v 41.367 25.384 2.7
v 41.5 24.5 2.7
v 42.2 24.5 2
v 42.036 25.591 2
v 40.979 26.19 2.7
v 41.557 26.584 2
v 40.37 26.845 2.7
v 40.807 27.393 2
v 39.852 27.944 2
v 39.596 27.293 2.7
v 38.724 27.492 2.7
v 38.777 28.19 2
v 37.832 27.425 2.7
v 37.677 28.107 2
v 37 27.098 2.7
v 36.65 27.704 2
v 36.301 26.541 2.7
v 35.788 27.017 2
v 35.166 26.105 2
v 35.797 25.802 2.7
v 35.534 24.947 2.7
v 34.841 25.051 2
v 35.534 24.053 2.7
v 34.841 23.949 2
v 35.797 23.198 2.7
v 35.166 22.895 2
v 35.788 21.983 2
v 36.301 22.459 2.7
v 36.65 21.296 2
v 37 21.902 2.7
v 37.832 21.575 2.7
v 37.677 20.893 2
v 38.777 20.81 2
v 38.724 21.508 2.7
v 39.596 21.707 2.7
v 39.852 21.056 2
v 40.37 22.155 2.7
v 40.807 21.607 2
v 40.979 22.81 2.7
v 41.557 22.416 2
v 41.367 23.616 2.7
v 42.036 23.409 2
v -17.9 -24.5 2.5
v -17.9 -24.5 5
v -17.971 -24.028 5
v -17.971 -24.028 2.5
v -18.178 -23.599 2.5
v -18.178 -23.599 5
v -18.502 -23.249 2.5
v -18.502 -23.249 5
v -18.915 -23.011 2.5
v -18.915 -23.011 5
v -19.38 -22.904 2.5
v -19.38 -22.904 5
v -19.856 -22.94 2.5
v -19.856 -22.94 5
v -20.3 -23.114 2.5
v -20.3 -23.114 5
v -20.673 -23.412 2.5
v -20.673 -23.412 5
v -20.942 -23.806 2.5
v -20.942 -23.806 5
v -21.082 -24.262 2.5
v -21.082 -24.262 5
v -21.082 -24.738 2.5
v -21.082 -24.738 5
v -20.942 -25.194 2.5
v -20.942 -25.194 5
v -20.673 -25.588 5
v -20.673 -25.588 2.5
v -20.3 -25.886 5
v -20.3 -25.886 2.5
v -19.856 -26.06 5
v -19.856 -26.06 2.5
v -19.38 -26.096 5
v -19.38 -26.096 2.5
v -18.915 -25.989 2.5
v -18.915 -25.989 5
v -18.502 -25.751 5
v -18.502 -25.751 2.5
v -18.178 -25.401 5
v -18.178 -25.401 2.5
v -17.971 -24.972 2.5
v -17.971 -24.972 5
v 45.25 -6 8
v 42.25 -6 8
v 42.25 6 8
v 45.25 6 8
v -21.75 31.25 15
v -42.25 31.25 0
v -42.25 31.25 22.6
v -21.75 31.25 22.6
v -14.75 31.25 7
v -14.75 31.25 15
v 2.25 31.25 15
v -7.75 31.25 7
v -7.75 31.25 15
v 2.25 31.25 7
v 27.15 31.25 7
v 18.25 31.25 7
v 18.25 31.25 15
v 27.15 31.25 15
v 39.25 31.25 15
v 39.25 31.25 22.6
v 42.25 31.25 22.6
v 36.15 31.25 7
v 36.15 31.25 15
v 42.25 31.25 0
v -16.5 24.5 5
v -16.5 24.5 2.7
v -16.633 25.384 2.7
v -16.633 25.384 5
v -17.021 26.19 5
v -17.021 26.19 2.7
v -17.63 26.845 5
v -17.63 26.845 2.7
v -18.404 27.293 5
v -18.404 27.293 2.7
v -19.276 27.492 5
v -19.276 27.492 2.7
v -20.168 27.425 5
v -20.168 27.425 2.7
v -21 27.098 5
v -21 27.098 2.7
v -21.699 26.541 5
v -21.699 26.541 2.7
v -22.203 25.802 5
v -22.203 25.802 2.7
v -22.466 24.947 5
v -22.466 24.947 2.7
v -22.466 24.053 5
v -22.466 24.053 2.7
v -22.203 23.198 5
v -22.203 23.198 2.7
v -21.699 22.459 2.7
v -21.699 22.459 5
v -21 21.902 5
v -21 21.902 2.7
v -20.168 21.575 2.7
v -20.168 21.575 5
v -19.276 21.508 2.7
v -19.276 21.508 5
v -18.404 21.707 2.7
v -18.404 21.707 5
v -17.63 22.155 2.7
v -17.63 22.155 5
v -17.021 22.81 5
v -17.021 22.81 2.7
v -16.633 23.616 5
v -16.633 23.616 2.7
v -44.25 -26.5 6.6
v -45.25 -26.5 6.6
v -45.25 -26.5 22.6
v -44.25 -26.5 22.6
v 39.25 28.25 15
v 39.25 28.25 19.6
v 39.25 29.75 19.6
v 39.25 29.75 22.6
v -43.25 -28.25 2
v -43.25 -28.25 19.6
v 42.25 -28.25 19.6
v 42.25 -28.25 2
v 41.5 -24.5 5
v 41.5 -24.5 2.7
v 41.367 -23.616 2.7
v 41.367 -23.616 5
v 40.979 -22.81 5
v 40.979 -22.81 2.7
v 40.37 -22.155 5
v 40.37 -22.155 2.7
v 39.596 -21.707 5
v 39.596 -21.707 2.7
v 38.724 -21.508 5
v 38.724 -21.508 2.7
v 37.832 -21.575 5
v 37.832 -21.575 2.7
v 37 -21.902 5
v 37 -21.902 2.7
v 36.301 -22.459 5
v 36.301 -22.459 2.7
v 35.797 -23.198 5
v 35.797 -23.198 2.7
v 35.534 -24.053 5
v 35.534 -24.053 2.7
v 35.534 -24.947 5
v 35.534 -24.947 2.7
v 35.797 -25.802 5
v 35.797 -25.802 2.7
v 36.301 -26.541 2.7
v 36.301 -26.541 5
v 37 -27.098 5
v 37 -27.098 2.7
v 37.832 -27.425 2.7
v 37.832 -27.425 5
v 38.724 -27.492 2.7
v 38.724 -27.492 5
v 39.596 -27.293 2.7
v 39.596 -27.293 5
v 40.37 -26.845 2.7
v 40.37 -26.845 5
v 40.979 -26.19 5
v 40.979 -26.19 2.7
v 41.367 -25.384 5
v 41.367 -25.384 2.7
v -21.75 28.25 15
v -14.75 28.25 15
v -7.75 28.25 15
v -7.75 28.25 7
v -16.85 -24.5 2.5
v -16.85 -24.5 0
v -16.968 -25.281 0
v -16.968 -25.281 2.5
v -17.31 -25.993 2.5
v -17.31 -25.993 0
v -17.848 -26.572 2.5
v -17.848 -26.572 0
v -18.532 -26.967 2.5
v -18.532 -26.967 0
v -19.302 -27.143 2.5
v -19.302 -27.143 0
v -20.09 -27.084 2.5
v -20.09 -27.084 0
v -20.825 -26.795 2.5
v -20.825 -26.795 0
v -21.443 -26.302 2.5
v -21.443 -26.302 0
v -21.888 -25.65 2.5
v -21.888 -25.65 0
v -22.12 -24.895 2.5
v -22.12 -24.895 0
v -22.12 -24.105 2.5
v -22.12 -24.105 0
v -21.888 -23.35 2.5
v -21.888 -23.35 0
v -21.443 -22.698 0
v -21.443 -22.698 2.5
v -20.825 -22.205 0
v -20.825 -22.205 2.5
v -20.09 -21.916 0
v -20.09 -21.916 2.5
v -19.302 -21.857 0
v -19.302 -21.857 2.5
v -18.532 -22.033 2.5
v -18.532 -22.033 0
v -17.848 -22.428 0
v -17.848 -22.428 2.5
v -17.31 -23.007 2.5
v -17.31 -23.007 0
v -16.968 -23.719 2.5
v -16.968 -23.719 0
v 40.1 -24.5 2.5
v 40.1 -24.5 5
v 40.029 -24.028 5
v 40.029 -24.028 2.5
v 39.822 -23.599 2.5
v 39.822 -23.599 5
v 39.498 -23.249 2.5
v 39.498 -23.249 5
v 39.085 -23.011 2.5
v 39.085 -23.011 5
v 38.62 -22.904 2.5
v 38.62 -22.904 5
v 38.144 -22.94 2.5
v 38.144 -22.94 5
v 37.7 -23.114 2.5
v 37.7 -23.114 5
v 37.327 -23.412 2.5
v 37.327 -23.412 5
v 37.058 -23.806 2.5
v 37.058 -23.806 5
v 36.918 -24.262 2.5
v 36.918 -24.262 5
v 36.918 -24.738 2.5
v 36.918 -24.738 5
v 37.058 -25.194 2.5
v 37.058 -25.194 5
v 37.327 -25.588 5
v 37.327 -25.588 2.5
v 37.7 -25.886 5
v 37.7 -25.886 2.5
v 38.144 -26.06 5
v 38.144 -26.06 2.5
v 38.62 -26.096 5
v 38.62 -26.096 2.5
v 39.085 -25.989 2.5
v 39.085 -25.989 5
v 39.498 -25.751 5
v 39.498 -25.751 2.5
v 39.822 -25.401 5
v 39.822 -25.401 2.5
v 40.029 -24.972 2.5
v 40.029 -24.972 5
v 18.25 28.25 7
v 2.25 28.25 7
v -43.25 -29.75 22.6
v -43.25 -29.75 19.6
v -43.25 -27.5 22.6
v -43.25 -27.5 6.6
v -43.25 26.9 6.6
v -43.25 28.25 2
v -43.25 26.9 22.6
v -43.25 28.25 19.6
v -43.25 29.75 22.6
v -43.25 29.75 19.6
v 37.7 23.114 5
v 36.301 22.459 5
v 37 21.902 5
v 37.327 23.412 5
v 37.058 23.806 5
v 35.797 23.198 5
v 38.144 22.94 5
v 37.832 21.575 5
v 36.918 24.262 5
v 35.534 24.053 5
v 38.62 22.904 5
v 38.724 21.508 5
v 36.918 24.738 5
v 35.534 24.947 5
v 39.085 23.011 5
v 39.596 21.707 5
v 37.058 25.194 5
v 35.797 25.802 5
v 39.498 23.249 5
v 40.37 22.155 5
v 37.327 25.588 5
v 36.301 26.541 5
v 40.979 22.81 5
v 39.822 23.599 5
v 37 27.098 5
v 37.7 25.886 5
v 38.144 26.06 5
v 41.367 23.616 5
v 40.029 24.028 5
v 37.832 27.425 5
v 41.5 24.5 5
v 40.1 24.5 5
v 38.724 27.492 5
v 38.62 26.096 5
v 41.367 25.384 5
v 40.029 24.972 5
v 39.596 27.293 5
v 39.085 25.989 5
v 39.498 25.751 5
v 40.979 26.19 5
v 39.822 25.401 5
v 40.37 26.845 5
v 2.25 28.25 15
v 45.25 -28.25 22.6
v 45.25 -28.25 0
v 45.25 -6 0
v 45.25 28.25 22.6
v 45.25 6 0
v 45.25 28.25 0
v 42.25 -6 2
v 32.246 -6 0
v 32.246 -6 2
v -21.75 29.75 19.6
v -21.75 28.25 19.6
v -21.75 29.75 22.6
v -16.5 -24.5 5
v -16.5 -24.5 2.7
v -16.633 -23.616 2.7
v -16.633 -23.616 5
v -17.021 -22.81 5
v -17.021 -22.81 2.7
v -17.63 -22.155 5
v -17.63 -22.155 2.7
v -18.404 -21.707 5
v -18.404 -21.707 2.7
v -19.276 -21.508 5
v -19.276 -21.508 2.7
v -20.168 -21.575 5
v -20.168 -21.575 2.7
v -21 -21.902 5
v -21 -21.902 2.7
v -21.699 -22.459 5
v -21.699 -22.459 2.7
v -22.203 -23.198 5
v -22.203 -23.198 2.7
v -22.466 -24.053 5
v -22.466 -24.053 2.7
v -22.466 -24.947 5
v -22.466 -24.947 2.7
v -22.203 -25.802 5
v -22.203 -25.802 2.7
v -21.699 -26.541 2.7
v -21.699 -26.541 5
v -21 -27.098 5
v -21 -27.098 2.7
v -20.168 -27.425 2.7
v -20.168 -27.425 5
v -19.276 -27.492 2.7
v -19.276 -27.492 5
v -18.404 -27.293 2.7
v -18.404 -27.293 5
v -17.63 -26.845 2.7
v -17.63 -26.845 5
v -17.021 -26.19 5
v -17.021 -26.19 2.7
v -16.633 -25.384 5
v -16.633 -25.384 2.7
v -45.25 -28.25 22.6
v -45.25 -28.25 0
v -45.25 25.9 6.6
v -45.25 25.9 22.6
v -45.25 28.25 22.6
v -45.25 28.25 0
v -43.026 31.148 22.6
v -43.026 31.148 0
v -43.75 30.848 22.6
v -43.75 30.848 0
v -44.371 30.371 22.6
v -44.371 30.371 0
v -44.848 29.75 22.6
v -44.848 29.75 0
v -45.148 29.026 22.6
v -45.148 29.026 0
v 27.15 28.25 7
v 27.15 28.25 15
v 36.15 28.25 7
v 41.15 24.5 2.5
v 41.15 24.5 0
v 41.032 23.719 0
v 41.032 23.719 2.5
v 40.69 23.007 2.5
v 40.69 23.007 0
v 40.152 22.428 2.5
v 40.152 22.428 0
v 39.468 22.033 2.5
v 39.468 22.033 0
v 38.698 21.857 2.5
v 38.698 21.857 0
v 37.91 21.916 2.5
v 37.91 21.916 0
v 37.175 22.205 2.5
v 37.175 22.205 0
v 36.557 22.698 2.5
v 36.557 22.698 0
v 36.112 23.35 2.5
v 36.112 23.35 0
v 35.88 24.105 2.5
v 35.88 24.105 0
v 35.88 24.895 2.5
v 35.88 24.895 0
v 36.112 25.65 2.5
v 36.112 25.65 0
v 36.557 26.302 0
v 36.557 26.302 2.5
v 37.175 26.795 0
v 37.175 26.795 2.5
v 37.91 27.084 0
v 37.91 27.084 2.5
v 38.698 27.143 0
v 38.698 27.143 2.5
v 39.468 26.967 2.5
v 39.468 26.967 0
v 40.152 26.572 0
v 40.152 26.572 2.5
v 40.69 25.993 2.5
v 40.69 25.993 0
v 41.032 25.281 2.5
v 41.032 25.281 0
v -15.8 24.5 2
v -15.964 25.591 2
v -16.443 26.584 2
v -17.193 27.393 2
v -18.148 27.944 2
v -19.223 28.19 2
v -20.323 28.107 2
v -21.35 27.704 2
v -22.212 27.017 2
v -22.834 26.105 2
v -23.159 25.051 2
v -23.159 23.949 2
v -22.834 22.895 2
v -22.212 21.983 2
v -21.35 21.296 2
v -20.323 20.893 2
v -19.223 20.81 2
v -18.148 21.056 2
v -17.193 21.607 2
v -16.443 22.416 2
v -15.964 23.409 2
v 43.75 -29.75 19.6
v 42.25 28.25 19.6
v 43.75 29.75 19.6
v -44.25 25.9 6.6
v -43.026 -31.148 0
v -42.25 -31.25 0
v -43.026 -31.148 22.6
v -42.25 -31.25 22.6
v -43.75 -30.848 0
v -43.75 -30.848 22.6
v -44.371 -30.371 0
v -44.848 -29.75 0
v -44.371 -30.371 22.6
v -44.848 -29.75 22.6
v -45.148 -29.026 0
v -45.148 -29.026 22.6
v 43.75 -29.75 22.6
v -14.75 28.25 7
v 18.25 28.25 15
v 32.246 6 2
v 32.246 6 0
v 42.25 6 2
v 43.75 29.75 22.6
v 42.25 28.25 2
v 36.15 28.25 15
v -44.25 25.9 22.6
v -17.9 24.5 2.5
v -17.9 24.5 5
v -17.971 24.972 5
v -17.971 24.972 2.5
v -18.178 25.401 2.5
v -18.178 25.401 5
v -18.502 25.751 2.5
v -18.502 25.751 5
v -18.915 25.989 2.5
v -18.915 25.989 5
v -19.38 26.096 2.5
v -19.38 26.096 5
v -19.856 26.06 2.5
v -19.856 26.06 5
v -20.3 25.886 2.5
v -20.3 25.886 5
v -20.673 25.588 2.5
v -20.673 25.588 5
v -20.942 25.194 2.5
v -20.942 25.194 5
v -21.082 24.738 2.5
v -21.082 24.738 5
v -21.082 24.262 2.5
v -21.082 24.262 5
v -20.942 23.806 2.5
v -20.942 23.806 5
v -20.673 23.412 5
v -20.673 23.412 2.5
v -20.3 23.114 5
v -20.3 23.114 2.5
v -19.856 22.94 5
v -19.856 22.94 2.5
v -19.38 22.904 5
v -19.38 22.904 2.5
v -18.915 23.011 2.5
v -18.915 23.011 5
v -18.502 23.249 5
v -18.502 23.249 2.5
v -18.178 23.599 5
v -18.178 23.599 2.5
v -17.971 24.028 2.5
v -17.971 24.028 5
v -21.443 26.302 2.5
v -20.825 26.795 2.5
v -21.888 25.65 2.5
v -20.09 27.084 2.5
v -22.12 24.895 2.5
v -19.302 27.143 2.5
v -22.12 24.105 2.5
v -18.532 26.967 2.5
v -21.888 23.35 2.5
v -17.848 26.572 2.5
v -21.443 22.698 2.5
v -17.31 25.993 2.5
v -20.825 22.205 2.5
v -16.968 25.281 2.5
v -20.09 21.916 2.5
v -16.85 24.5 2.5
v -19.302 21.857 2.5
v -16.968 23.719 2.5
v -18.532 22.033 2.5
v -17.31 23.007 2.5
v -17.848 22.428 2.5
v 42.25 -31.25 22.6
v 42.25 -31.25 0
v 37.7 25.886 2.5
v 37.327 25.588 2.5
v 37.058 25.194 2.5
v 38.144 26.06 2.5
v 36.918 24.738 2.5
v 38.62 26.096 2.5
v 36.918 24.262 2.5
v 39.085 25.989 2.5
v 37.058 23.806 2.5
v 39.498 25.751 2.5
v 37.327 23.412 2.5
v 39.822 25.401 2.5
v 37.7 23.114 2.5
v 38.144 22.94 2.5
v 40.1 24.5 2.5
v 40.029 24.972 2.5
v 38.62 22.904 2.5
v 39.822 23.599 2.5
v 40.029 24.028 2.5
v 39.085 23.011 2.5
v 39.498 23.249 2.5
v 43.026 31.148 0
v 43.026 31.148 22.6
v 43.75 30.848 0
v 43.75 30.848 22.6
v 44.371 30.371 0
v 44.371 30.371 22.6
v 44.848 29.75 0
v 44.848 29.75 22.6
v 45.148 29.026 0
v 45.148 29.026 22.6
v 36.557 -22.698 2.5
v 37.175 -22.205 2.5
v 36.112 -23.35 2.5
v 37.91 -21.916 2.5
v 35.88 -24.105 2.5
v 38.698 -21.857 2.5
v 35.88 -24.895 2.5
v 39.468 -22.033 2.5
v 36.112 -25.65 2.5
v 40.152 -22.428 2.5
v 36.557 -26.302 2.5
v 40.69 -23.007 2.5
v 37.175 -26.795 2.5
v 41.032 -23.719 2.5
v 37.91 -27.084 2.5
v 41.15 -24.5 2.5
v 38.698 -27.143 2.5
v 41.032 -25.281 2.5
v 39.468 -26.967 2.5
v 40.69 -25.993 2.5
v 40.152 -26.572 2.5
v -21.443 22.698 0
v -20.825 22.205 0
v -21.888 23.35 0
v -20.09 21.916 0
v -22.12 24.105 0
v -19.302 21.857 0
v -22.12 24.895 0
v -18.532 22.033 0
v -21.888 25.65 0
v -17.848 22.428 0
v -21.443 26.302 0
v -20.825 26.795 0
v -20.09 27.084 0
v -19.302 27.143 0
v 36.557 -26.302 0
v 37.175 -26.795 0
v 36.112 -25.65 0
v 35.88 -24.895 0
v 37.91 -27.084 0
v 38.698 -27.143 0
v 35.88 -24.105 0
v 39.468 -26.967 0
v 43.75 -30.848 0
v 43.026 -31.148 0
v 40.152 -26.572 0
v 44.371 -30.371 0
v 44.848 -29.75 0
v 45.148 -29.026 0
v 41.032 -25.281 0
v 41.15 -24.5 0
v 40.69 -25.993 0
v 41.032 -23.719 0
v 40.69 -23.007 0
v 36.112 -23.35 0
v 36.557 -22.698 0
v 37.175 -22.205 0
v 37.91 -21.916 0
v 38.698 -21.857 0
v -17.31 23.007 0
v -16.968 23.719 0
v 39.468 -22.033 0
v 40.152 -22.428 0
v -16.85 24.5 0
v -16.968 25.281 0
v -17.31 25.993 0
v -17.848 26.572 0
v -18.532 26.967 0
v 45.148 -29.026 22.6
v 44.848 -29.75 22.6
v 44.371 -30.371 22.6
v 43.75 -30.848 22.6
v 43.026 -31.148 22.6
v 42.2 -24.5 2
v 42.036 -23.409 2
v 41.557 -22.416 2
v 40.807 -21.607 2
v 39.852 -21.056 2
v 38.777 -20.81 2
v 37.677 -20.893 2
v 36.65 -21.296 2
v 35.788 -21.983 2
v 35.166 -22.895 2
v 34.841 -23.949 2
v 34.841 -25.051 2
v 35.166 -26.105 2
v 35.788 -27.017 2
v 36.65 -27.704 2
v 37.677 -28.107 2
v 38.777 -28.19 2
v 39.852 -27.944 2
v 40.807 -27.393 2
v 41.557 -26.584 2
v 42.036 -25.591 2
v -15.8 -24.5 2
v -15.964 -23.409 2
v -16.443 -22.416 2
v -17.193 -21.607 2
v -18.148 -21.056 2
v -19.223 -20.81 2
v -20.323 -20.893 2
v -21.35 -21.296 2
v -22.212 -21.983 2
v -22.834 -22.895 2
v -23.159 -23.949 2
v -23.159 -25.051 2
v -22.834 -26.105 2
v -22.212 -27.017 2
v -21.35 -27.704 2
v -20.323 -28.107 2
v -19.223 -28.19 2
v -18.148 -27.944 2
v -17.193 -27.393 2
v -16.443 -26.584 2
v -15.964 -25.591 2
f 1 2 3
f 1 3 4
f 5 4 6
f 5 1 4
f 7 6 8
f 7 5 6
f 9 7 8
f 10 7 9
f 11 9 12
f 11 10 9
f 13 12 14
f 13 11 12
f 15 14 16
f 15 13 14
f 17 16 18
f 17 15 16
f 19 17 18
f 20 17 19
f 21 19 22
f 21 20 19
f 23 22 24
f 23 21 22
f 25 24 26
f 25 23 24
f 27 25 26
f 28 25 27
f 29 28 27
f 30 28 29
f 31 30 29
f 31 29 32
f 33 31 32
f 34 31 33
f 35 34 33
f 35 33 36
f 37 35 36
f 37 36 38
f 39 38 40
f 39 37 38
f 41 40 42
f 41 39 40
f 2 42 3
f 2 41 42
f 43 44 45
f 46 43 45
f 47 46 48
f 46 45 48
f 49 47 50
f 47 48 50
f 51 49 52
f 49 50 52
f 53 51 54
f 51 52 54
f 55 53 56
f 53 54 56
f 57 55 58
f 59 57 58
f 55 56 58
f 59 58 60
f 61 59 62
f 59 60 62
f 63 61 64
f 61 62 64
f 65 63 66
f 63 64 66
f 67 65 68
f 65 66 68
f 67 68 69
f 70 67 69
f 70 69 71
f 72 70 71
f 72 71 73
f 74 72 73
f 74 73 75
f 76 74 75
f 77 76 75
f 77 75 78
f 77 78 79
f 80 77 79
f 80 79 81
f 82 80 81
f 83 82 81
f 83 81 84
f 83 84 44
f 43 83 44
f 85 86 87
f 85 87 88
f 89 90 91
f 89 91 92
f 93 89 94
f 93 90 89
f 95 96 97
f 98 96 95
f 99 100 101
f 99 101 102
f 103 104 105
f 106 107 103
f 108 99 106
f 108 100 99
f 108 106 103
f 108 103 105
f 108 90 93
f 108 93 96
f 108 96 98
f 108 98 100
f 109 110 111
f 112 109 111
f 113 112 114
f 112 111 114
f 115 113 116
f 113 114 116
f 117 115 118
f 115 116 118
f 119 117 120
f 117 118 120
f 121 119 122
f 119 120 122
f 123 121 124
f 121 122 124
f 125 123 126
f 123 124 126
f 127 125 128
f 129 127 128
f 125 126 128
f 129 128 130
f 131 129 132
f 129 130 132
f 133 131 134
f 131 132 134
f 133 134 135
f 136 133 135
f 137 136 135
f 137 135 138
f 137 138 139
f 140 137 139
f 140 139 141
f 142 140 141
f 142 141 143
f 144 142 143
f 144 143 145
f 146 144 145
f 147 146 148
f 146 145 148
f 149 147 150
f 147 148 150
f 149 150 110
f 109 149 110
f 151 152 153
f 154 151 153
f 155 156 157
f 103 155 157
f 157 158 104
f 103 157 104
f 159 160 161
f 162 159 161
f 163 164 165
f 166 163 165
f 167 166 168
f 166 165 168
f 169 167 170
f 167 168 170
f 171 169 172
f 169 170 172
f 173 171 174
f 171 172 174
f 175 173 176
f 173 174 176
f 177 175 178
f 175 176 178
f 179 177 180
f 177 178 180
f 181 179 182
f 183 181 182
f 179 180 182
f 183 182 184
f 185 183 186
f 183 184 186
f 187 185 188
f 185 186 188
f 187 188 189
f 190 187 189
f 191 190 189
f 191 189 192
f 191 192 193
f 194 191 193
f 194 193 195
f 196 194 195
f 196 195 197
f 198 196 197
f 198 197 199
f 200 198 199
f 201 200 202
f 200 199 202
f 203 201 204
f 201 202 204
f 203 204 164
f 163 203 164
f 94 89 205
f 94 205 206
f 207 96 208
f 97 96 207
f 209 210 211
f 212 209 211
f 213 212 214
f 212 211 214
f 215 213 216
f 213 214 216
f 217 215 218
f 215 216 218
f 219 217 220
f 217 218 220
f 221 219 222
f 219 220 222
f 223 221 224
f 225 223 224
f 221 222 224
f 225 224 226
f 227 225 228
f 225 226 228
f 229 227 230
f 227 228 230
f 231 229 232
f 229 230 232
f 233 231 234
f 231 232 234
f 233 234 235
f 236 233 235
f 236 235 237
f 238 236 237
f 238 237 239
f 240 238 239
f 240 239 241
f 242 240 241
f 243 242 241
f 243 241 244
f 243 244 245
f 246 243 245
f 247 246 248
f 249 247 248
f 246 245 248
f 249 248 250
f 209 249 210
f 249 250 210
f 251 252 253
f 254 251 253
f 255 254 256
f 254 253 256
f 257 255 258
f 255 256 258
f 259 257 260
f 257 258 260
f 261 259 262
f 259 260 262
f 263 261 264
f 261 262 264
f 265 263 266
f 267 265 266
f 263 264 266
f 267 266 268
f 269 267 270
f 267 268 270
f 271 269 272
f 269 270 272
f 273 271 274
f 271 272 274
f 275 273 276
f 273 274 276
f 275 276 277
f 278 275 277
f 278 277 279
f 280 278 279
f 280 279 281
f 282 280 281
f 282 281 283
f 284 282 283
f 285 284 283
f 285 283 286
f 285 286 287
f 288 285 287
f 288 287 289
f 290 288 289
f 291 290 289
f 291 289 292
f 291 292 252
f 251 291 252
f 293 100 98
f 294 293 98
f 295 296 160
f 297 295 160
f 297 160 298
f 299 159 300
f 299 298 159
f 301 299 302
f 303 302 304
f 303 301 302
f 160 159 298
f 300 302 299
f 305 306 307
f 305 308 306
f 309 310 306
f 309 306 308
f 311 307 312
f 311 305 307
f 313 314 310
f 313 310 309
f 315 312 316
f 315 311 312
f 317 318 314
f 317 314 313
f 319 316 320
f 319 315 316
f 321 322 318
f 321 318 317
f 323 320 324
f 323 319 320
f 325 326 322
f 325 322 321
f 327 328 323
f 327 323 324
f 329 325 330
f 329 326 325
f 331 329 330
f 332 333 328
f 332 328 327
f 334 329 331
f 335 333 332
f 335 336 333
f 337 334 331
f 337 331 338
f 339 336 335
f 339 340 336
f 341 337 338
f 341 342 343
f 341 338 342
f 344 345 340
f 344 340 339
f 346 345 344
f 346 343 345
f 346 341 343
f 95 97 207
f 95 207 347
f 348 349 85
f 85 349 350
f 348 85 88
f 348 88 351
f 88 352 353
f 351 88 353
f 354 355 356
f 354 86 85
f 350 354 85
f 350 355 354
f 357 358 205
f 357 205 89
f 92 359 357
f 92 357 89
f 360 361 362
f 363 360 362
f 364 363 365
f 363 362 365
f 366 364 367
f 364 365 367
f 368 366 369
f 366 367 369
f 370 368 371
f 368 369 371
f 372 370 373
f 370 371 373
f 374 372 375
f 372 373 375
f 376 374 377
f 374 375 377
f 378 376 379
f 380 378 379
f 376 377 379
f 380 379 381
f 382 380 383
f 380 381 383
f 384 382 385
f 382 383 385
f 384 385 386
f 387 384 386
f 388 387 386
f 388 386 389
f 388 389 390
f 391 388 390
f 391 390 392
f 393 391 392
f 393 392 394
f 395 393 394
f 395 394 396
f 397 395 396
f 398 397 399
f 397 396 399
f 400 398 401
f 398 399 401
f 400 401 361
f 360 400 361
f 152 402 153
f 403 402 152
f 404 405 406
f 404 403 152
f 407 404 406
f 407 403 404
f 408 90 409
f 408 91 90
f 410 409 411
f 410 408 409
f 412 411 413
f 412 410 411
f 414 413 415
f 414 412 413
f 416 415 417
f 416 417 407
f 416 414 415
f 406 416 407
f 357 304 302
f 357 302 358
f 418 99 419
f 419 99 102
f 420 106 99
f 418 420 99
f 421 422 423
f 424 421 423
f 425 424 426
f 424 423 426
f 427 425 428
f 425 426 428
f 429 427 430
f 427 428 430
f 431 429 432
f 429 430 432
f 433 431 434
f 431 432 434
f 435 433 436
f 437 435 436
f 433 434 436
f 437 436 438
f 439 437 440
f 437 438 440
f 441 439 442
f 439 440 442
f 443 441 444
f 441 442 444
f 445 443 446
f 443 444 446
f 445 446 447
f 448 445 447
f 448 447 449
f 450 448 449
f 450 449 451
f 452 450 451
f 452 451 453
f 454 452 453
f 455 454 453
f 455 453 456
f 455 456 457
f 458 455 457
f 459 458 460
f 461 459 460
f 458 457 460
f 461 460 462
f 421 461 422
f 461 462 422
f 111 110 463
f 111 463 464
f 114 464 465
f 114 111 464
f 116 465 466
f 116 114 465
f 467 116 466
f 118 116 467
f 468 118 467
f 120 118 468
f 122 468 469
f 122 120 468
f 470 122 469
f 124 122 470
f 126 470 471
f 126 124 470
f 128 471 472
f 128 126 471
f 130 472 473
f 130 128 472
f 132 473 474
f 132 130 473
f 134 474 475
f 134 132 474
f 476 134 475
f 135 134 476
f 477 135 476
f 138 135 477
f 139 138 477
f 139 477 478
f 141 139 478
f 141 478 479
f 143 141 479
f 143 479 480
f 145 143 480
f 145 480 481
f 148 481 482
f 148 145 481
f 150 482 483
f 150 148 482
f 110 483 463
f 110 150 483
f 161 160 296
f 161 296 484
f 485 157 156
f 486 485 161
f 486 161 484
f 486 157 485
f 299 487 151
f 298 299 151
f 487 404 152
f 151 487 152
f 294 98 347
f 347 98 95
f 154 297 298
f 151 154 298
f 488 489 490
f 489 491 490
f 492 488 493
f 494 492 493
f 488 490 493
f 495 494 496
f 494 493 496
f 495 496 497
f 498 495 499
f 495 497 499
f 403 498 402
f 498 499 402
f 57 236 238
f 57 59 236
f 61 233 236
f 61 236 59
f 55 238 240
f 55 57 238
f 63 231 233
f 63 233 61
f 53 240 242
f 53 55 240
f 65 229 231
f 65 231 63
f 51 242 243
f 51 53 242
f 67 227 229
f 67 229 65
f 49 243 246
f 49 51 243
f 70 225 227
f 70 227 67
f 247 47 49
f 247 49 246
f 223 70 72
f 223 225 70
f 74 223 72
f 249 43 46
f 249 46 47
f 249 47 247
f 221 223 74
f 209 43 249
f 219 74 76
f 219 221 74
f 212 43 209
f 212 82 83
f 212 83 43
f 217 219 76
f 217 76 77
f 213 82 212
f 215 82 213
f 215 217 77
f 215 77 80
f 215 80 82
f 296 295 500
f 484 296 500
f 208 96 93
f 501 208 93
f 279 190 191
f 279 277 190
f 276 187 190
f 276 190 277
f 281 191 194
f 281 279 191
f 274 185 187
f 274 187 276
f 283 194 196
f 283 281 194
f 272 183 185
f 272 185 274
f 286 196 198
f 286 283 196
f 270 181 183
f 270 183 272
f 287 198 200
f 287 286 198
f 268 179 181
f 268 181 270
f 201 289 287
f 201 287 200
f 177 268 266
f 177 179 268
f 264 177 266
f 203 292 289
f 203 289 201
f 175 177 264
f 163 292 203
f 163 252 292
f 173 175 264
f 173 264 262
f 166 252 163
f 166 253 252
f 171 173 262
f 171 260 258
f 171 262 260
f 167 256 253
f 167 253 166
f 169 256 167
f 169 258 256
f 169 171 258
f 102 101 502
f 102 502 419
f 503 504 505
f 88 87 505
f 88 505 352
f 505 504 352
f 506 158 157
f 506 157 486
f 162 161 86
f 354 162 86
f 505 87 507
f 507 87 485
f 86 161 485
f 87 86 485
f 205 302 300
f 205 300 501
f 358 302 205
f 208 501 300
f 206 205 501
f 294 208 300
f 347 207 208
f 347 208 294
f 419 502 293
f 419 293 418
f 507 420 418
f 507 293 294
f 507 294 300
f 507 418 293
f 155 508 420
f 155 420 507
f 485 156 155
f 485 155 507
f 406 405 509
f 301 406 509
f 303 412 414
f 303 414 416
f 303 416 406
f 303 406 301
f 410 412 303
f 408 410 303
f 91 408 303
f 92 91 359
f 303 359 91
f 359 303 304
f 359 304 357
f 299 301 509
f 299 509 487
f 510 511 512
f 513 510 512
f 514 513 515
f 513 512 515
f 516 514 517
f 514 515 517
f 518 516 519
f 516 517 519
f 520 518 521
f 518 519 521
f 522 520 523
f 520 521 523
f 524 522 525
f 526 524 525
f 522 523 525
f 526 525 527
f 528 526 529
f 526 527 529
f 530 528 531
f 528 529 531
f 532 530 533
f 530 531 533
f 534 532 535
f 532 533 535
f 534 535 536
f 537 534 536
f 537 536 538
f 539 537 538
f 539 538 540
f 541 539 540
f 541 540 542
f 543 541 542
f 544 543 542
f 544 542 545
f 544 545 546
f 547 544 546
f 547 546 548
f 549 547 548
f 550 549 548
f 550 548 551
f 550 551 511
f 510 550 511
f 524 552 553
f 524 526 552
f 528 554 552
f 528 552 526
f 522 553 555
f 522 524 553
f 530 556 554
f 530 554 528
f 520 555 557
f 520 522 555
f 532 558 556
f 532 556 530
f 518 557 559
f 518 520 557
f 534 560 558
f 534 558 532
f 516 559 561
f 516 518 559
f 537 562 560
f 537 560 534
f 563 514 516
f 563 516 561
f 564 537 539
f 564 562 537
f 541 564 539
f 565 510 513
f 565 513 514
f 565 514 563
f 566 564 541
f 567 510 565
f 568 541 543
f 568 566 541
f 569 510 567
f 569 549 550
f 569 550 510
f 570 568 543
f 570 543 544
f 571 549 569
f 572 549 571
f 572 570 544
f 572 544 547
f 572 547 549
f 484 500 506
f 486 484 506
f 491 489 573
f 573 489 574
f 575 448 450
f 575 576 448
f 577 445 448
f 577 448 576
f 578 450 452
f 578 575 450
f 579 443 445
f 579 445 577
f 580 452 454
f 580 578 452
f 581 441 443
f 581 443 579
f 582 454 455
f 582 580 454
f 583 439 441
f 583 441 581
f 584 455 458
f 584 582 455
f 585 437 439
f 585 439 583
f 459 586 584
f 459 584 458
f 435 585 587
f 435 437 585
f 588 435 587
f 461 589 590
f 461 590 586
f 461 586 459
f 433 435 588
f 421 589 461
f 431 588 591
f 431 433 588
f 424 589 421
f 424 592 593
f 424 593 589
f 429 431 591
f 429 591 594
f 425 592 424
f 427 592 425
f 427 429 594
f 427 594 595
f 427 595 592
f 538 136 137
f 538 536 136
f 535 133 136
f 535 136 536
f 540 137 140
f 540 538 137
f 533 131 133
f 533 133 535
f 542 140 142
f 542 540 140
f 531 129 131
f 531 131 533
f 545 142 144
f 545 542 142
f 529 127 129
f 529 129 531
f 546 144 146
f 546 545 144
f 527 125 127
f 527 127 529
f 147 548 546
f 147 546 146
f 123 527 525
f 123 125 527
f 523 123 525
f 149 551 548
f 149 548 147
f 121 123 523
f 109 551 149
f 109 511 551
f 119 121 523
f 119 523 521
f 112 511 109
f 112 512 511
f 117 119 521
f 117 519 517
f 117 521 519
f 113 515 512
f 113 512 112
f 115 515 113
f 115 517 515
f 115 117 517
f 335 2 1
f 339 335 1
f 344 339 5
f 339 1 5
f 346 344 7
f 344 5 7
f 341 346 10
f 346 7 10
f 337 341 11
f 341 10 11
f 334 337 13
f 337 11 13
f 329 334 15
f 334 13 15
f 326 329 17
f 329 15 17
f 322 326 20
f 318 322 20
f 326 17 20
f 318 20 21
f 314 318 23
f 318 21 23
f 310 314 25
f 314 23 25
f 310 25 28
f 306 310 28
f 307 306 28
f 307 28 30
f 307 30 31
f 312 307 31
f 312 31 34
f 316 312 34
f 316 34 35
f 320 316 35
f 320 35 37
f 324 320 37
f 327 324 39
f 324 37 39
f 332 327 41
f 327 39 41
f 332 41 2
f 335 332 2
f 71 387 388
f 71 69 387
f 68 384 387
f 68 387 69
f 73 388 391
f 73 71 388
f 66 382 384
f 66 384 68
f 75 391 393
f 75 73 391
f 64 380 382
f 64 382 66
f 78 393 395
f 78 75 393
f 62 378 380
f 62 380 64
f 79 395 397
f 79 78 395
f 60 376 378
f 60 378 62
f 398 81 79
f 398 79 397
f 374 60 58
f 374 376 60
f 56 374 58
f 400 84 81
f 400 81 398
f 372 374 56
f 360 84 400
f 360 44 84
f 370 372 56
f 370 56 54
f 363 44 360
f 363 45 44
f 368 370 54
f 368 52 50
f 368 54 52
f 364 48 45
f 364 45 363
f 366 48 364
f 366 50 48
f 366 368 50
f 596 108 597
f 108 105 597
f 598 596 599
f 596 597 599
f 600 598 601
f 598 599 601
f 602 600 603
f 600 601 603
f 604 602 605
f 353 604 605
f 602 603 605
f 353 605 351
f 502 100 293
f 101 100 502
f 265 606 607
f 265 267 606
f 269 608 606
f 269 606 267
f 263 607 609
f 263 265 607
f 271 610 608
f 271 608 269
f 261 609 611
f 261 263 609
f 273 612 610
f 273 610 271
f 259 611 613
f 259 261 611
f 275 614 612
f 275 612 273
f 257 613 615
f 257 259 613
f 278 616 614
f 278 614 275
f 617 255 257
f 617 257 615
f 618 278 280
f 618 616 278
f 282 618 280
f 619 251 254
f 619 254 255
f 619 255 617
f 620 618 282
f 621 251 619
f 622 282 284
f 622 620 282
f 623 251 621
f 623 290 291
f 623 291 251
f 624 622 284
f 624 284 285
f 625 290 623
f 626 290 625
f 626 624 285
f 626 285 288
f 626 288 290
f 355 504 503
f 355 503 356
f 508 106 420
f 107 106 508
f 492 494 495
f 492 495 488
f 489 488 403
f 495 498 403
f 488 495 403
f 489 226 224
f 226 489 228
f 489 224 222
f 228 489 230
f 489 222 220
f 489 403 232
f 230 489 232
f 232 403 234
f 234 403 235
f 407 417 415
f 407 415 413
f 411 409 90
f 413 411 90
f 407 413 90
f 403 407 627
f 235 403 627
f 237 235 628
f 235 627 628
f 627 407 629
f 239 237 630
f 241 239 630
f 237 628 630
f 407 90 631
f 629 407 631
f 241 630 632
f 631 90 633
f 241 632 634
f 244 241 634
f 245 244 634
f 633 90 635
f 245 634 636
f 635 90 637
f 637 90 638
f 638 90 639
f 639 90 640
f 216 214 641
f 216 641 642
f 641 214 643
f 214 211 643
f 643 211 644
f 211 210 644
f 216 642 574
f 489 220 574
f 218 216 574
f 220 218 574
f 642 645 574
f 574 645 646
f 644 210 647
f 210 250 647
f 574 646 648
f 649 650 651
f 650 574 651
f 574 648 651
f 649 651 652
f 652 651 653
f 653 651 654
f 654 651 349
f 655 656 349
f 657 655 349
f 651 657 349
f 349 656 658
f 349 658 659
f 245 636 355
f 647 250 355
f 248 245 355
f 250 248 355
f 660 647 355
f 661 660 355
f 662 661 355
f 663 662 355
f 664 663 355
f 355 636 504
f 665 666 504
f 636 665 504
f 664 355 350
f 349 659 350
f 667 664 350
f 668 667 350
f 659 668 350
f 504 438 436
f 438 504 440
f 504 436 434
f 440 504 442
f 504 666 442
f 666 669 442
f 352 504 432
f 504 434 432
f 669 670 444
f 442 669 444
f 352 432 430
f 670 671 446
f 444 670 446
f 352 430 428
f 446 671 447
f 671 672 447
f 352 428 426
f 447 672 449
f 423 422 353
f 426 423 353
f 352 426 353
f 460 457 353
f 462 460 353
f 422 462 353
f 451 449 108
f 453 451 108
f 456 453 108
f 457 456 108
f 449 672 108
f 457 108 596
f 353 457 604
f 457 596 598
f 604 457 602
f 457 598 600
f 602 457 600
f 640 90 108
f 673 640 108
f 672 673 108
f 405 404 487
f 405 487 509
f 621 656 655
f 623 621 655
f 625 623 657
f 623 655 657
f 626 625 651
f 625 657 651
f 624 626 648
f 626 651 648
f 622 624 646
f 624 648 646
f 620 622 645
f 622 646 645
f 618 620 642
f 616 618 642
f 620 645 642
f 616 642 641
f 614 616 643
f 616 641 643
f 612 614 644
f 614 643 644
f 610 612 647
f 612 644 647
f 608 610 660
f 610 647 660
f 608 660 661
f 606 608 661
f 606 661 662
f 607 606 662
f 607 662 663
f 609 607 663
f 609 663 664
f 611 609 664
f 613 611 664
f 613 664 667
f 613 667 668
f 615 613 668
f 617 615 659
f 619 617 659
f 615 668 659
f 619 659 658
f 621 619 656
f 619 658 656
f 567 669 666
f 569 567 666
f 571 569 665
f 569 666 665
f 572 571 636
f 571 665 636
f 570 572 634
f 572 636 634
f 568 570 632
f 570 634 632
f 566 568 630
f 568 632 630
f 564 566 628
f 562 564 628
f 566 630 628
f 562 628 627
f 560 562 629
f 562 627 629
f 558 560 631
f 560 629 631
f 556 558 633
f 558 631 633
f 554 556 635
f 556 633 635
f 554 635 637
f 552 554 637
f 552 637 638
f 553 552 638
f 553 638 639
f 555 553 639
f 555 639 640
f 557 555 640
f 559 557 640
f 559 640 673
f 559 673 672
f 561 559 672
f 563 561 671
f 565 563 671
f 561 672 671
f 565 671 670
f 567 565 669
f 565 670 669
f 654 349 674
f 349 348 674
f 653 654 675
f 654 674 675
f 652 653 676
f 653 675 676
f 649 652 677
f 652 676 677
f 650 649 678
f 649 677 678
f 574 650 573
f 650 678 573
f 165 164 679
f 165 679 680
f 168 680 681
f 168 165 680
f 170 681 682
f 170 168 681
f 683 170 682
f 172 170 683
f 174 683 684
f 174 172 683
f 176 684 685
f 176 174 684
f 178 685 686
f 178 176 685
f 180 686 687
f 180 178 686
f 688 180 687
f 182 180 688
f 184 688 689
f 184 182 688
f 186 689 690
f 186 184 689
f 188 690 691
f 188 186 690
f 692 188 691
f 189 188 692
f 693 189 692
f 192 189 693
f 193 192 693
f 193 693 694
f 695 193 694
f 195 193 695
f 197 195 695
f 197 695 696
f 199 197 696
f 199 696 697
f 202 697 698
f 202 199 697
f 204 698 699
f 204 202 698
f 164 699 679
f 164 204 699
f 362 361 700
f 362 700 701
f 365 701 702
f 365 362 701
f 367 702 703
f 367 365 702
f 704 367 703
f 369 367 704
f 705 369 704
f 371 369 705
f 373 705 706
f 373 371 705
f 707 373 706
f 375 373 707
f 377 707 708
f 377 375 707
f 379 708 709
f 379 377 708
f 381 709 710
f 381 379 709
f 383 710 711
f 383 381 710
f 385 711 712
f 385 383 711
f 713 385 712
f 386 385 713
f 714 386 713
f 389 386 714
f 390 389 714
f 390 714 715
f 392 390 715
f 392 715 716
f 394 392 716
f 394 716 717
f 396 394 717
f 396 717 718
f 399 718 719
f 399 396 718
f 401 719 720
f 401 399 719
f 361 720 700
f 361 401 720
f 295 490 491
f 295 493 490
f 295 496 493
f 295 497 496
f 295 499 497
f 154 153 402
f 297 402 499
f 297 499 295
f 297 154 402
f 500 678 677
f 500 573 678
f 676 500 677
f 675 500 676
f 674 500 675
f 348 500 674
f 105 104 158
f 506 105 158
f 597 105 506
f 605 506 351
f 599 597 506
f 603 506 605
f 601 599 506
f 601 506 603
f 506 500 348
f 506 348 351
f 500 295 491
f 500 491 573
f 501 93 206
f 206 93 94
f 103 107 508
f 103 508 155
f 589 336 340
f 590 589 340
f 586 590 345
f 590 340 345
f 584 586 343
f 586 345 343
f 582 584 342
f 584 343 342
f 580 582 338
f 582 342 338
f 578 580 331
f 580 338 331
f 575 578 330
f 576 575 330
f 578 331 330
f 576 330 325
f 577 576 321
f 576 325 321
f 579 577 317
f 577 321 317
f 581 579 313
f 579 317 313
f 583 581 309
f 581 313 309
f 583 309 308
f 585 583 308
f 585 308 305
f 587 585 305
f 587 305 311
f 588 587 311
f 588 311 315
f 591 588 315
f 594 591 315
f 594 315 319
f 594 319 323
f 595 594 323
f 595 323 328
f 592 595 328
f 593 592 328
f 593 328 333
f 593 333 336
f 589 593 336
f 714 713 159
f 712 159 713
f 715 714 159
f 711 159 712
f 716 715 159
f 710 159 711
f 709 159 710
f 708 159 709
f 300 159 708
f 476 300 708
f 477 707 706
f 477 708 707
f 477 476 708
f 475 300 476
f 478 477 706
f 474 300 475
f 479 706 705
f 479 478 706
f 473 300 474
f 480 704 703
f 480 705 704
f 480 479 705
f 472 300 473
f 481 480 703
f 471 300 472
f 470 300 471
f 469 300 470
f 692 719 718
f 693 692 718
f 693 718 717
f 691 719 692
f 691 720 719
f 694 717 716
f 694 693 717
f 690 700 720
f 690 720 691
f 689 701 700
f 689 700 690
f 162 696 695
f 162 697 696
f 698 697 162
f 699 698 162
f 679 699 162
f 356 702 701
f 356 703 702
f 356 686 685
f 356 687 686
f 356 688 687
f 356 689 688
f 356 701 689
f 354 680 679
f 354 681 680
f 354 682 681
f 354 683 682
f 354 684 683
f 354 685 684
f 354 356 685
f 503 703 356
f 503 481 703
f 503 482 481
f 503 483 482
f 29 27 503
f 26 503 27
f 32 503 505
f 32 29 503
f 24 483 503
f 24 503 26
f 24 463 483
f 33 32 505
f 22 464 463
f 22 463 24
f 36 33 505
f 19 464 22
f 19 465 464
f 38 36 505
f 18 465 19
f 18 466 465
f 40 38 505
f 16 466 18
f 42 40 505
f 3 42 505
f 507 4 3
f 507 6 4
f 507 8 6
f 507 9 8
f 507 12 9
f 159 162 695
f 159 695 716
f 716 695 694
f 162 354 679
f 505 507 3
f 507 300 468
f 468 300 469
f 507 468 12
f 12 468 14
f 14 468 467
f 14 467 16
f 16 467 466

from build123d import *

# Parameters (mm, degrees)
SKETCH_W        = 90.5
SKETCH_H        = 62.5
PAD_DEPTH       = 22.6
SKETCH001_W     = 85.5
SKETCH001_H     = 56.5
POCKET_DEPTH    = 20.6
SKETCH002_W     = 15
SKETCH002_H     = 16
SKETCH002_W_2   = 16.3
POCKET001_DEPTH = 5
SKETCH003_R     = 3
PAD001_DEPTH    = 3
SKETCH004_R     = 1.6
POCKET002_DEPTH = 5
SKETCH005_R     = 2.65
POCKET003_DEPTH = 2.5
CHAMFER_SIZE    = 0.7
SKETCH006_W     = 61
SKETCH006_H     = 3
POCKET004_DEPTH = 7.6
SKETCH007_W     = 21.5
SKETCH007_H     = 1.5
POCKET005_DEPTH = 3
SKETCH008_W     = 3
SKETCH008_H     = 1.5
POCKET006_DEPTH = 3
SKETCH009_W     = 1.5
SKETCH009_H     = 58
POCKET007_DEPTH = 3
SKETCH010_W     = 87
SKETCH010_H     = 1.5
POCKET008_DEPTH = 3
CHAMFER001_SIZE = 1
FILLET_R        = 3
SKETCH011_W     = 9
SKETCH011_H     = 8
SKETCH011_W_2   = 16
SKETCH011_W_3   = 7
POCKET009_DEPTH = 5
SKETCH012_W     = 52.4
SKETCH012_H     = 16
POCKET010_DEPTH = 5
SKETCH013_W     = 13.003716
SKETCH013_H     = 12
POCKET011_DEPTH = 8


with BuildPart() as part:
    # Sketch → Pad (new body)
    with BuildSketch(Plane.XY):
        Rectangle(SKETCH_W, SKETCH_H)
    extrude(amount=PAD_DEPTH)

    # Sketch001 (on Face6 of Pad) → Pocket (cut)
    with BuildSketch(Plane.XY.offset(22.6)):
        with Locations((-0.5, 0)):
            Rectangle(SKETCH001_W, SKETCH001_H)
    extrude(amount=-POCKET_DEPTH, mode=Mode.SUBTRACT)

    # Sketch002 (on Face2 of Pocket) → Pocket001 (cut)
    with BuildSketch(Plane(origin=(-45.25, 0, 0), x_dir=(0, -1, 0), z_dir=(-1, 0, 0))):
        with Locations((19, 14.6)):
            Rectangle(SKETCH002_W, SKETCH002_H)
        with Locations((1, 14.6)):
            Rectangle(SKETCH002_W, SKETCH002_H)
        with Locations((-17.75, 14.6)):
            Rectangle(SKETCH002_W_2, SKETCH002_H)
    extrude(amount=-POCKET001_DEPTH, mode=Mode.SUBTRACT)

    # Sketch003 (on Face22 of Pocket001) → Pad001 (join)
    with BuildSketch(Plane.XY.offset(2)):
        with Locations((-19.5, 24.5)):
            Circle(SKETCH003_R)
        with Locations((38.5, 24.5)):
            Circle(SKETCH003_R)
        with Locations((-19.5, -24.5)):
            Circle(SKETCH003_R)
        with Locations((38.5, -24.5)):
            Circle(SKETCH003_R)
    extrude(amount=PAD001_DEPTH)

    # Sketch004 (on Face30 of Pad001) → Pocket002 (cut)
    with BuildSketch(Plane.XY.offset(5)):
        with Locations((-19.5, 24.5)):
            Circle(SKETCH004_R)
        with Locations((38.5, 24.5)):
            Circle(SKETCH004_R)
        with Locations((-19.5, -24.5)):
            Circle(SKETCH004_R)
        with Locations((38.5, -24.5)):
            Circle(SKETCH004_R)
    extrude(amount=-POCKET002_DEPTH, mode=Mode.SUBTRACT)

    # Sketch005 (on Face4 of Pocket002) → Pocket003 (cut)
    with BuildSketch(Plane(origin=(0, 0, 0), x_dir=(1, 0, 0), z_dir=(0, 0, -1))):
        with Locations((38.5, 24.5)):
            Circle(SKETCH005_R)
        with Locations((-19.5, 24.5)):
            Circle(SKETCH005_R)
        with Locations((-19.5, -24.5)):
            Circle(SKETCH005_R)
        with Locations((38.5, -24.5)):
            Circle(SKETCH005_R)
    extrude(amount=-POCKET003_DEPTH, mode=Mode.SUBTRACT)

    # Chamfer
    chamfer_edges = [part.edges().sort_by_distance(p)[0] for p in [
        (-22.5, -24.5, 2),
        (35.5, -24.5, 2),
        (-22.5, 24.5, 2),
        (35.5, 24.5, 2),
    ]]
    chamfer(chamfer_edges, length=CHAMFER_SIZE)

    # Sketch006 (on Face11 of Chamfer) → Pocket004 (cut)
    with BuildSketch(Plane.XY.offset(22.6)):
        with Locations((8.75, 29.75)):
            Rectangle(SKETCH006_W, SKETCH006_H)
    extrude(amount=-POCKET004_DEPTH, mode=Mode.SUBTRACT)

    # Sketch007 (on Face11 of Pocket004) → Pocket005 (cut)
    with BuildSketch(Plane.XY.offset(22.6)):
        with Locations((-32.5, 29)):
            Rectangle(SKETCH007_W, SKETCH007_H)
    extrude(amount=-POCKET005_DEPTH, mode=Mode.SUBTRACT)

    # Sketch008 (on Face15 of Pocket005) → Pocket006 (cut)
    with BuildSketch(Plane.XY.offset(22.6)):
        with Locations((40.75, 29)):
            Rectangle(SKETCH008_W, SKETCH008_H)
    extrude(amount=-POCKET006_DEPTH, mode=Mode.SUBTRACT)

    # Sketch009 (on Face16 of Pocket006) → Pocket007 (cut)
    with BuildSketch(Plane.XY.offset(22.6)):
        with Locations((43, 0.75)):
            Rectangle(SKETCH009_W, SKETCH009_H)
    extrude(amount=-POCKET007_DEPTH, mode=Mode.SUBTRACT)

    # Sketch010 (on Face16 of Pocket007) → Pocket008 (cut)
    with BuildSketch(Plane.XY.offset(22.6)):
        with Locations((0.25, -29)):
            Rectangle(SKETCH010_W, SKETCH010_H)
    extrude(amount=-POCKET008_DEPTH, mode=Mode.SUBTRACT)

    # Chamfer001
    chamfer001_edges = [part.edges().sort_by_distance(p)[0] for p in [
        (-43.25, -11.5, 14.6),
        (-43.25, -8.5, 14.6),
        (-43.25, 6.5, 14.6),
        (-43.25, 9.6, 14.6),
        (-43.25, 25.9, 14.6),
        (-43.25, -26.5, 14.6),
    ]]
    chamfer(chamfer001_edges, length=CHAMFER001_SIZE)

    # Fillet
    fillet_edges = [part.edges().sort_by_distance(p)[0] for p in [
        (-45.25, -31.25, 11.3),
        (45.25, -31.25, 11.3),
        (-45.25, 31.25, 11.3),
        (45.25, 31.25, 11.3),
    ]]
    fillet(fillet_edges, radius=FILLET_R)

    # Sketch011 (on Face13 of Fillet) → Pocket009 (cut)
    with BuildSketch(Plane(origin=(0, 31.25, 0), x_dir=(-1, 0, 0), z_dir=(0, 1, 0))):
        with Locations((-31.65, 11)):
            Rectangle(SKETCH011_W, SKETCH011_H)
        with Locations((-10.25, 11)):
            Rectangle(SKETCH011_W_2, SKETCH011_H)
        with Locations((11.25, 11)):
            Rectangle(SKETCH011_W_3, SKETCH011_H)
    extrude(amount=-POCKET009_DEPTH, mode=Mode.SUBTRACT)

    # Sketch012 (on Face2 of Pocket009) → Pocket010 (cut)
    with BuildSketch(Plane(origin=(-45.25, 0, 0), x_dir=(0, -1, 0), z_dir=(-1, 0, 0))):
        with Locations((0.3, 14.6)):
            Rectangle(SKETCH012_W, SKETCH012_H)
    extrude(amount=-POCKET010_DEPTH, mode=Mode.SUBTRACT)

    # Sketch013 (on Face19 of Pocket010) → Pocket011 (cut)
    with BuildSketch(Plane(origin=(0, 0, 0), x_dir=(1, 0, 0), z_dir=(0, 0, -1))):
        with Locations((38.748142, 0)):
            Rectangle(SKETCH013_W, SKETCH013_H)
    extrude(amount=-POCKET011_DEPTH, mode=Mode.SUBTRACT)


solid = part.part
